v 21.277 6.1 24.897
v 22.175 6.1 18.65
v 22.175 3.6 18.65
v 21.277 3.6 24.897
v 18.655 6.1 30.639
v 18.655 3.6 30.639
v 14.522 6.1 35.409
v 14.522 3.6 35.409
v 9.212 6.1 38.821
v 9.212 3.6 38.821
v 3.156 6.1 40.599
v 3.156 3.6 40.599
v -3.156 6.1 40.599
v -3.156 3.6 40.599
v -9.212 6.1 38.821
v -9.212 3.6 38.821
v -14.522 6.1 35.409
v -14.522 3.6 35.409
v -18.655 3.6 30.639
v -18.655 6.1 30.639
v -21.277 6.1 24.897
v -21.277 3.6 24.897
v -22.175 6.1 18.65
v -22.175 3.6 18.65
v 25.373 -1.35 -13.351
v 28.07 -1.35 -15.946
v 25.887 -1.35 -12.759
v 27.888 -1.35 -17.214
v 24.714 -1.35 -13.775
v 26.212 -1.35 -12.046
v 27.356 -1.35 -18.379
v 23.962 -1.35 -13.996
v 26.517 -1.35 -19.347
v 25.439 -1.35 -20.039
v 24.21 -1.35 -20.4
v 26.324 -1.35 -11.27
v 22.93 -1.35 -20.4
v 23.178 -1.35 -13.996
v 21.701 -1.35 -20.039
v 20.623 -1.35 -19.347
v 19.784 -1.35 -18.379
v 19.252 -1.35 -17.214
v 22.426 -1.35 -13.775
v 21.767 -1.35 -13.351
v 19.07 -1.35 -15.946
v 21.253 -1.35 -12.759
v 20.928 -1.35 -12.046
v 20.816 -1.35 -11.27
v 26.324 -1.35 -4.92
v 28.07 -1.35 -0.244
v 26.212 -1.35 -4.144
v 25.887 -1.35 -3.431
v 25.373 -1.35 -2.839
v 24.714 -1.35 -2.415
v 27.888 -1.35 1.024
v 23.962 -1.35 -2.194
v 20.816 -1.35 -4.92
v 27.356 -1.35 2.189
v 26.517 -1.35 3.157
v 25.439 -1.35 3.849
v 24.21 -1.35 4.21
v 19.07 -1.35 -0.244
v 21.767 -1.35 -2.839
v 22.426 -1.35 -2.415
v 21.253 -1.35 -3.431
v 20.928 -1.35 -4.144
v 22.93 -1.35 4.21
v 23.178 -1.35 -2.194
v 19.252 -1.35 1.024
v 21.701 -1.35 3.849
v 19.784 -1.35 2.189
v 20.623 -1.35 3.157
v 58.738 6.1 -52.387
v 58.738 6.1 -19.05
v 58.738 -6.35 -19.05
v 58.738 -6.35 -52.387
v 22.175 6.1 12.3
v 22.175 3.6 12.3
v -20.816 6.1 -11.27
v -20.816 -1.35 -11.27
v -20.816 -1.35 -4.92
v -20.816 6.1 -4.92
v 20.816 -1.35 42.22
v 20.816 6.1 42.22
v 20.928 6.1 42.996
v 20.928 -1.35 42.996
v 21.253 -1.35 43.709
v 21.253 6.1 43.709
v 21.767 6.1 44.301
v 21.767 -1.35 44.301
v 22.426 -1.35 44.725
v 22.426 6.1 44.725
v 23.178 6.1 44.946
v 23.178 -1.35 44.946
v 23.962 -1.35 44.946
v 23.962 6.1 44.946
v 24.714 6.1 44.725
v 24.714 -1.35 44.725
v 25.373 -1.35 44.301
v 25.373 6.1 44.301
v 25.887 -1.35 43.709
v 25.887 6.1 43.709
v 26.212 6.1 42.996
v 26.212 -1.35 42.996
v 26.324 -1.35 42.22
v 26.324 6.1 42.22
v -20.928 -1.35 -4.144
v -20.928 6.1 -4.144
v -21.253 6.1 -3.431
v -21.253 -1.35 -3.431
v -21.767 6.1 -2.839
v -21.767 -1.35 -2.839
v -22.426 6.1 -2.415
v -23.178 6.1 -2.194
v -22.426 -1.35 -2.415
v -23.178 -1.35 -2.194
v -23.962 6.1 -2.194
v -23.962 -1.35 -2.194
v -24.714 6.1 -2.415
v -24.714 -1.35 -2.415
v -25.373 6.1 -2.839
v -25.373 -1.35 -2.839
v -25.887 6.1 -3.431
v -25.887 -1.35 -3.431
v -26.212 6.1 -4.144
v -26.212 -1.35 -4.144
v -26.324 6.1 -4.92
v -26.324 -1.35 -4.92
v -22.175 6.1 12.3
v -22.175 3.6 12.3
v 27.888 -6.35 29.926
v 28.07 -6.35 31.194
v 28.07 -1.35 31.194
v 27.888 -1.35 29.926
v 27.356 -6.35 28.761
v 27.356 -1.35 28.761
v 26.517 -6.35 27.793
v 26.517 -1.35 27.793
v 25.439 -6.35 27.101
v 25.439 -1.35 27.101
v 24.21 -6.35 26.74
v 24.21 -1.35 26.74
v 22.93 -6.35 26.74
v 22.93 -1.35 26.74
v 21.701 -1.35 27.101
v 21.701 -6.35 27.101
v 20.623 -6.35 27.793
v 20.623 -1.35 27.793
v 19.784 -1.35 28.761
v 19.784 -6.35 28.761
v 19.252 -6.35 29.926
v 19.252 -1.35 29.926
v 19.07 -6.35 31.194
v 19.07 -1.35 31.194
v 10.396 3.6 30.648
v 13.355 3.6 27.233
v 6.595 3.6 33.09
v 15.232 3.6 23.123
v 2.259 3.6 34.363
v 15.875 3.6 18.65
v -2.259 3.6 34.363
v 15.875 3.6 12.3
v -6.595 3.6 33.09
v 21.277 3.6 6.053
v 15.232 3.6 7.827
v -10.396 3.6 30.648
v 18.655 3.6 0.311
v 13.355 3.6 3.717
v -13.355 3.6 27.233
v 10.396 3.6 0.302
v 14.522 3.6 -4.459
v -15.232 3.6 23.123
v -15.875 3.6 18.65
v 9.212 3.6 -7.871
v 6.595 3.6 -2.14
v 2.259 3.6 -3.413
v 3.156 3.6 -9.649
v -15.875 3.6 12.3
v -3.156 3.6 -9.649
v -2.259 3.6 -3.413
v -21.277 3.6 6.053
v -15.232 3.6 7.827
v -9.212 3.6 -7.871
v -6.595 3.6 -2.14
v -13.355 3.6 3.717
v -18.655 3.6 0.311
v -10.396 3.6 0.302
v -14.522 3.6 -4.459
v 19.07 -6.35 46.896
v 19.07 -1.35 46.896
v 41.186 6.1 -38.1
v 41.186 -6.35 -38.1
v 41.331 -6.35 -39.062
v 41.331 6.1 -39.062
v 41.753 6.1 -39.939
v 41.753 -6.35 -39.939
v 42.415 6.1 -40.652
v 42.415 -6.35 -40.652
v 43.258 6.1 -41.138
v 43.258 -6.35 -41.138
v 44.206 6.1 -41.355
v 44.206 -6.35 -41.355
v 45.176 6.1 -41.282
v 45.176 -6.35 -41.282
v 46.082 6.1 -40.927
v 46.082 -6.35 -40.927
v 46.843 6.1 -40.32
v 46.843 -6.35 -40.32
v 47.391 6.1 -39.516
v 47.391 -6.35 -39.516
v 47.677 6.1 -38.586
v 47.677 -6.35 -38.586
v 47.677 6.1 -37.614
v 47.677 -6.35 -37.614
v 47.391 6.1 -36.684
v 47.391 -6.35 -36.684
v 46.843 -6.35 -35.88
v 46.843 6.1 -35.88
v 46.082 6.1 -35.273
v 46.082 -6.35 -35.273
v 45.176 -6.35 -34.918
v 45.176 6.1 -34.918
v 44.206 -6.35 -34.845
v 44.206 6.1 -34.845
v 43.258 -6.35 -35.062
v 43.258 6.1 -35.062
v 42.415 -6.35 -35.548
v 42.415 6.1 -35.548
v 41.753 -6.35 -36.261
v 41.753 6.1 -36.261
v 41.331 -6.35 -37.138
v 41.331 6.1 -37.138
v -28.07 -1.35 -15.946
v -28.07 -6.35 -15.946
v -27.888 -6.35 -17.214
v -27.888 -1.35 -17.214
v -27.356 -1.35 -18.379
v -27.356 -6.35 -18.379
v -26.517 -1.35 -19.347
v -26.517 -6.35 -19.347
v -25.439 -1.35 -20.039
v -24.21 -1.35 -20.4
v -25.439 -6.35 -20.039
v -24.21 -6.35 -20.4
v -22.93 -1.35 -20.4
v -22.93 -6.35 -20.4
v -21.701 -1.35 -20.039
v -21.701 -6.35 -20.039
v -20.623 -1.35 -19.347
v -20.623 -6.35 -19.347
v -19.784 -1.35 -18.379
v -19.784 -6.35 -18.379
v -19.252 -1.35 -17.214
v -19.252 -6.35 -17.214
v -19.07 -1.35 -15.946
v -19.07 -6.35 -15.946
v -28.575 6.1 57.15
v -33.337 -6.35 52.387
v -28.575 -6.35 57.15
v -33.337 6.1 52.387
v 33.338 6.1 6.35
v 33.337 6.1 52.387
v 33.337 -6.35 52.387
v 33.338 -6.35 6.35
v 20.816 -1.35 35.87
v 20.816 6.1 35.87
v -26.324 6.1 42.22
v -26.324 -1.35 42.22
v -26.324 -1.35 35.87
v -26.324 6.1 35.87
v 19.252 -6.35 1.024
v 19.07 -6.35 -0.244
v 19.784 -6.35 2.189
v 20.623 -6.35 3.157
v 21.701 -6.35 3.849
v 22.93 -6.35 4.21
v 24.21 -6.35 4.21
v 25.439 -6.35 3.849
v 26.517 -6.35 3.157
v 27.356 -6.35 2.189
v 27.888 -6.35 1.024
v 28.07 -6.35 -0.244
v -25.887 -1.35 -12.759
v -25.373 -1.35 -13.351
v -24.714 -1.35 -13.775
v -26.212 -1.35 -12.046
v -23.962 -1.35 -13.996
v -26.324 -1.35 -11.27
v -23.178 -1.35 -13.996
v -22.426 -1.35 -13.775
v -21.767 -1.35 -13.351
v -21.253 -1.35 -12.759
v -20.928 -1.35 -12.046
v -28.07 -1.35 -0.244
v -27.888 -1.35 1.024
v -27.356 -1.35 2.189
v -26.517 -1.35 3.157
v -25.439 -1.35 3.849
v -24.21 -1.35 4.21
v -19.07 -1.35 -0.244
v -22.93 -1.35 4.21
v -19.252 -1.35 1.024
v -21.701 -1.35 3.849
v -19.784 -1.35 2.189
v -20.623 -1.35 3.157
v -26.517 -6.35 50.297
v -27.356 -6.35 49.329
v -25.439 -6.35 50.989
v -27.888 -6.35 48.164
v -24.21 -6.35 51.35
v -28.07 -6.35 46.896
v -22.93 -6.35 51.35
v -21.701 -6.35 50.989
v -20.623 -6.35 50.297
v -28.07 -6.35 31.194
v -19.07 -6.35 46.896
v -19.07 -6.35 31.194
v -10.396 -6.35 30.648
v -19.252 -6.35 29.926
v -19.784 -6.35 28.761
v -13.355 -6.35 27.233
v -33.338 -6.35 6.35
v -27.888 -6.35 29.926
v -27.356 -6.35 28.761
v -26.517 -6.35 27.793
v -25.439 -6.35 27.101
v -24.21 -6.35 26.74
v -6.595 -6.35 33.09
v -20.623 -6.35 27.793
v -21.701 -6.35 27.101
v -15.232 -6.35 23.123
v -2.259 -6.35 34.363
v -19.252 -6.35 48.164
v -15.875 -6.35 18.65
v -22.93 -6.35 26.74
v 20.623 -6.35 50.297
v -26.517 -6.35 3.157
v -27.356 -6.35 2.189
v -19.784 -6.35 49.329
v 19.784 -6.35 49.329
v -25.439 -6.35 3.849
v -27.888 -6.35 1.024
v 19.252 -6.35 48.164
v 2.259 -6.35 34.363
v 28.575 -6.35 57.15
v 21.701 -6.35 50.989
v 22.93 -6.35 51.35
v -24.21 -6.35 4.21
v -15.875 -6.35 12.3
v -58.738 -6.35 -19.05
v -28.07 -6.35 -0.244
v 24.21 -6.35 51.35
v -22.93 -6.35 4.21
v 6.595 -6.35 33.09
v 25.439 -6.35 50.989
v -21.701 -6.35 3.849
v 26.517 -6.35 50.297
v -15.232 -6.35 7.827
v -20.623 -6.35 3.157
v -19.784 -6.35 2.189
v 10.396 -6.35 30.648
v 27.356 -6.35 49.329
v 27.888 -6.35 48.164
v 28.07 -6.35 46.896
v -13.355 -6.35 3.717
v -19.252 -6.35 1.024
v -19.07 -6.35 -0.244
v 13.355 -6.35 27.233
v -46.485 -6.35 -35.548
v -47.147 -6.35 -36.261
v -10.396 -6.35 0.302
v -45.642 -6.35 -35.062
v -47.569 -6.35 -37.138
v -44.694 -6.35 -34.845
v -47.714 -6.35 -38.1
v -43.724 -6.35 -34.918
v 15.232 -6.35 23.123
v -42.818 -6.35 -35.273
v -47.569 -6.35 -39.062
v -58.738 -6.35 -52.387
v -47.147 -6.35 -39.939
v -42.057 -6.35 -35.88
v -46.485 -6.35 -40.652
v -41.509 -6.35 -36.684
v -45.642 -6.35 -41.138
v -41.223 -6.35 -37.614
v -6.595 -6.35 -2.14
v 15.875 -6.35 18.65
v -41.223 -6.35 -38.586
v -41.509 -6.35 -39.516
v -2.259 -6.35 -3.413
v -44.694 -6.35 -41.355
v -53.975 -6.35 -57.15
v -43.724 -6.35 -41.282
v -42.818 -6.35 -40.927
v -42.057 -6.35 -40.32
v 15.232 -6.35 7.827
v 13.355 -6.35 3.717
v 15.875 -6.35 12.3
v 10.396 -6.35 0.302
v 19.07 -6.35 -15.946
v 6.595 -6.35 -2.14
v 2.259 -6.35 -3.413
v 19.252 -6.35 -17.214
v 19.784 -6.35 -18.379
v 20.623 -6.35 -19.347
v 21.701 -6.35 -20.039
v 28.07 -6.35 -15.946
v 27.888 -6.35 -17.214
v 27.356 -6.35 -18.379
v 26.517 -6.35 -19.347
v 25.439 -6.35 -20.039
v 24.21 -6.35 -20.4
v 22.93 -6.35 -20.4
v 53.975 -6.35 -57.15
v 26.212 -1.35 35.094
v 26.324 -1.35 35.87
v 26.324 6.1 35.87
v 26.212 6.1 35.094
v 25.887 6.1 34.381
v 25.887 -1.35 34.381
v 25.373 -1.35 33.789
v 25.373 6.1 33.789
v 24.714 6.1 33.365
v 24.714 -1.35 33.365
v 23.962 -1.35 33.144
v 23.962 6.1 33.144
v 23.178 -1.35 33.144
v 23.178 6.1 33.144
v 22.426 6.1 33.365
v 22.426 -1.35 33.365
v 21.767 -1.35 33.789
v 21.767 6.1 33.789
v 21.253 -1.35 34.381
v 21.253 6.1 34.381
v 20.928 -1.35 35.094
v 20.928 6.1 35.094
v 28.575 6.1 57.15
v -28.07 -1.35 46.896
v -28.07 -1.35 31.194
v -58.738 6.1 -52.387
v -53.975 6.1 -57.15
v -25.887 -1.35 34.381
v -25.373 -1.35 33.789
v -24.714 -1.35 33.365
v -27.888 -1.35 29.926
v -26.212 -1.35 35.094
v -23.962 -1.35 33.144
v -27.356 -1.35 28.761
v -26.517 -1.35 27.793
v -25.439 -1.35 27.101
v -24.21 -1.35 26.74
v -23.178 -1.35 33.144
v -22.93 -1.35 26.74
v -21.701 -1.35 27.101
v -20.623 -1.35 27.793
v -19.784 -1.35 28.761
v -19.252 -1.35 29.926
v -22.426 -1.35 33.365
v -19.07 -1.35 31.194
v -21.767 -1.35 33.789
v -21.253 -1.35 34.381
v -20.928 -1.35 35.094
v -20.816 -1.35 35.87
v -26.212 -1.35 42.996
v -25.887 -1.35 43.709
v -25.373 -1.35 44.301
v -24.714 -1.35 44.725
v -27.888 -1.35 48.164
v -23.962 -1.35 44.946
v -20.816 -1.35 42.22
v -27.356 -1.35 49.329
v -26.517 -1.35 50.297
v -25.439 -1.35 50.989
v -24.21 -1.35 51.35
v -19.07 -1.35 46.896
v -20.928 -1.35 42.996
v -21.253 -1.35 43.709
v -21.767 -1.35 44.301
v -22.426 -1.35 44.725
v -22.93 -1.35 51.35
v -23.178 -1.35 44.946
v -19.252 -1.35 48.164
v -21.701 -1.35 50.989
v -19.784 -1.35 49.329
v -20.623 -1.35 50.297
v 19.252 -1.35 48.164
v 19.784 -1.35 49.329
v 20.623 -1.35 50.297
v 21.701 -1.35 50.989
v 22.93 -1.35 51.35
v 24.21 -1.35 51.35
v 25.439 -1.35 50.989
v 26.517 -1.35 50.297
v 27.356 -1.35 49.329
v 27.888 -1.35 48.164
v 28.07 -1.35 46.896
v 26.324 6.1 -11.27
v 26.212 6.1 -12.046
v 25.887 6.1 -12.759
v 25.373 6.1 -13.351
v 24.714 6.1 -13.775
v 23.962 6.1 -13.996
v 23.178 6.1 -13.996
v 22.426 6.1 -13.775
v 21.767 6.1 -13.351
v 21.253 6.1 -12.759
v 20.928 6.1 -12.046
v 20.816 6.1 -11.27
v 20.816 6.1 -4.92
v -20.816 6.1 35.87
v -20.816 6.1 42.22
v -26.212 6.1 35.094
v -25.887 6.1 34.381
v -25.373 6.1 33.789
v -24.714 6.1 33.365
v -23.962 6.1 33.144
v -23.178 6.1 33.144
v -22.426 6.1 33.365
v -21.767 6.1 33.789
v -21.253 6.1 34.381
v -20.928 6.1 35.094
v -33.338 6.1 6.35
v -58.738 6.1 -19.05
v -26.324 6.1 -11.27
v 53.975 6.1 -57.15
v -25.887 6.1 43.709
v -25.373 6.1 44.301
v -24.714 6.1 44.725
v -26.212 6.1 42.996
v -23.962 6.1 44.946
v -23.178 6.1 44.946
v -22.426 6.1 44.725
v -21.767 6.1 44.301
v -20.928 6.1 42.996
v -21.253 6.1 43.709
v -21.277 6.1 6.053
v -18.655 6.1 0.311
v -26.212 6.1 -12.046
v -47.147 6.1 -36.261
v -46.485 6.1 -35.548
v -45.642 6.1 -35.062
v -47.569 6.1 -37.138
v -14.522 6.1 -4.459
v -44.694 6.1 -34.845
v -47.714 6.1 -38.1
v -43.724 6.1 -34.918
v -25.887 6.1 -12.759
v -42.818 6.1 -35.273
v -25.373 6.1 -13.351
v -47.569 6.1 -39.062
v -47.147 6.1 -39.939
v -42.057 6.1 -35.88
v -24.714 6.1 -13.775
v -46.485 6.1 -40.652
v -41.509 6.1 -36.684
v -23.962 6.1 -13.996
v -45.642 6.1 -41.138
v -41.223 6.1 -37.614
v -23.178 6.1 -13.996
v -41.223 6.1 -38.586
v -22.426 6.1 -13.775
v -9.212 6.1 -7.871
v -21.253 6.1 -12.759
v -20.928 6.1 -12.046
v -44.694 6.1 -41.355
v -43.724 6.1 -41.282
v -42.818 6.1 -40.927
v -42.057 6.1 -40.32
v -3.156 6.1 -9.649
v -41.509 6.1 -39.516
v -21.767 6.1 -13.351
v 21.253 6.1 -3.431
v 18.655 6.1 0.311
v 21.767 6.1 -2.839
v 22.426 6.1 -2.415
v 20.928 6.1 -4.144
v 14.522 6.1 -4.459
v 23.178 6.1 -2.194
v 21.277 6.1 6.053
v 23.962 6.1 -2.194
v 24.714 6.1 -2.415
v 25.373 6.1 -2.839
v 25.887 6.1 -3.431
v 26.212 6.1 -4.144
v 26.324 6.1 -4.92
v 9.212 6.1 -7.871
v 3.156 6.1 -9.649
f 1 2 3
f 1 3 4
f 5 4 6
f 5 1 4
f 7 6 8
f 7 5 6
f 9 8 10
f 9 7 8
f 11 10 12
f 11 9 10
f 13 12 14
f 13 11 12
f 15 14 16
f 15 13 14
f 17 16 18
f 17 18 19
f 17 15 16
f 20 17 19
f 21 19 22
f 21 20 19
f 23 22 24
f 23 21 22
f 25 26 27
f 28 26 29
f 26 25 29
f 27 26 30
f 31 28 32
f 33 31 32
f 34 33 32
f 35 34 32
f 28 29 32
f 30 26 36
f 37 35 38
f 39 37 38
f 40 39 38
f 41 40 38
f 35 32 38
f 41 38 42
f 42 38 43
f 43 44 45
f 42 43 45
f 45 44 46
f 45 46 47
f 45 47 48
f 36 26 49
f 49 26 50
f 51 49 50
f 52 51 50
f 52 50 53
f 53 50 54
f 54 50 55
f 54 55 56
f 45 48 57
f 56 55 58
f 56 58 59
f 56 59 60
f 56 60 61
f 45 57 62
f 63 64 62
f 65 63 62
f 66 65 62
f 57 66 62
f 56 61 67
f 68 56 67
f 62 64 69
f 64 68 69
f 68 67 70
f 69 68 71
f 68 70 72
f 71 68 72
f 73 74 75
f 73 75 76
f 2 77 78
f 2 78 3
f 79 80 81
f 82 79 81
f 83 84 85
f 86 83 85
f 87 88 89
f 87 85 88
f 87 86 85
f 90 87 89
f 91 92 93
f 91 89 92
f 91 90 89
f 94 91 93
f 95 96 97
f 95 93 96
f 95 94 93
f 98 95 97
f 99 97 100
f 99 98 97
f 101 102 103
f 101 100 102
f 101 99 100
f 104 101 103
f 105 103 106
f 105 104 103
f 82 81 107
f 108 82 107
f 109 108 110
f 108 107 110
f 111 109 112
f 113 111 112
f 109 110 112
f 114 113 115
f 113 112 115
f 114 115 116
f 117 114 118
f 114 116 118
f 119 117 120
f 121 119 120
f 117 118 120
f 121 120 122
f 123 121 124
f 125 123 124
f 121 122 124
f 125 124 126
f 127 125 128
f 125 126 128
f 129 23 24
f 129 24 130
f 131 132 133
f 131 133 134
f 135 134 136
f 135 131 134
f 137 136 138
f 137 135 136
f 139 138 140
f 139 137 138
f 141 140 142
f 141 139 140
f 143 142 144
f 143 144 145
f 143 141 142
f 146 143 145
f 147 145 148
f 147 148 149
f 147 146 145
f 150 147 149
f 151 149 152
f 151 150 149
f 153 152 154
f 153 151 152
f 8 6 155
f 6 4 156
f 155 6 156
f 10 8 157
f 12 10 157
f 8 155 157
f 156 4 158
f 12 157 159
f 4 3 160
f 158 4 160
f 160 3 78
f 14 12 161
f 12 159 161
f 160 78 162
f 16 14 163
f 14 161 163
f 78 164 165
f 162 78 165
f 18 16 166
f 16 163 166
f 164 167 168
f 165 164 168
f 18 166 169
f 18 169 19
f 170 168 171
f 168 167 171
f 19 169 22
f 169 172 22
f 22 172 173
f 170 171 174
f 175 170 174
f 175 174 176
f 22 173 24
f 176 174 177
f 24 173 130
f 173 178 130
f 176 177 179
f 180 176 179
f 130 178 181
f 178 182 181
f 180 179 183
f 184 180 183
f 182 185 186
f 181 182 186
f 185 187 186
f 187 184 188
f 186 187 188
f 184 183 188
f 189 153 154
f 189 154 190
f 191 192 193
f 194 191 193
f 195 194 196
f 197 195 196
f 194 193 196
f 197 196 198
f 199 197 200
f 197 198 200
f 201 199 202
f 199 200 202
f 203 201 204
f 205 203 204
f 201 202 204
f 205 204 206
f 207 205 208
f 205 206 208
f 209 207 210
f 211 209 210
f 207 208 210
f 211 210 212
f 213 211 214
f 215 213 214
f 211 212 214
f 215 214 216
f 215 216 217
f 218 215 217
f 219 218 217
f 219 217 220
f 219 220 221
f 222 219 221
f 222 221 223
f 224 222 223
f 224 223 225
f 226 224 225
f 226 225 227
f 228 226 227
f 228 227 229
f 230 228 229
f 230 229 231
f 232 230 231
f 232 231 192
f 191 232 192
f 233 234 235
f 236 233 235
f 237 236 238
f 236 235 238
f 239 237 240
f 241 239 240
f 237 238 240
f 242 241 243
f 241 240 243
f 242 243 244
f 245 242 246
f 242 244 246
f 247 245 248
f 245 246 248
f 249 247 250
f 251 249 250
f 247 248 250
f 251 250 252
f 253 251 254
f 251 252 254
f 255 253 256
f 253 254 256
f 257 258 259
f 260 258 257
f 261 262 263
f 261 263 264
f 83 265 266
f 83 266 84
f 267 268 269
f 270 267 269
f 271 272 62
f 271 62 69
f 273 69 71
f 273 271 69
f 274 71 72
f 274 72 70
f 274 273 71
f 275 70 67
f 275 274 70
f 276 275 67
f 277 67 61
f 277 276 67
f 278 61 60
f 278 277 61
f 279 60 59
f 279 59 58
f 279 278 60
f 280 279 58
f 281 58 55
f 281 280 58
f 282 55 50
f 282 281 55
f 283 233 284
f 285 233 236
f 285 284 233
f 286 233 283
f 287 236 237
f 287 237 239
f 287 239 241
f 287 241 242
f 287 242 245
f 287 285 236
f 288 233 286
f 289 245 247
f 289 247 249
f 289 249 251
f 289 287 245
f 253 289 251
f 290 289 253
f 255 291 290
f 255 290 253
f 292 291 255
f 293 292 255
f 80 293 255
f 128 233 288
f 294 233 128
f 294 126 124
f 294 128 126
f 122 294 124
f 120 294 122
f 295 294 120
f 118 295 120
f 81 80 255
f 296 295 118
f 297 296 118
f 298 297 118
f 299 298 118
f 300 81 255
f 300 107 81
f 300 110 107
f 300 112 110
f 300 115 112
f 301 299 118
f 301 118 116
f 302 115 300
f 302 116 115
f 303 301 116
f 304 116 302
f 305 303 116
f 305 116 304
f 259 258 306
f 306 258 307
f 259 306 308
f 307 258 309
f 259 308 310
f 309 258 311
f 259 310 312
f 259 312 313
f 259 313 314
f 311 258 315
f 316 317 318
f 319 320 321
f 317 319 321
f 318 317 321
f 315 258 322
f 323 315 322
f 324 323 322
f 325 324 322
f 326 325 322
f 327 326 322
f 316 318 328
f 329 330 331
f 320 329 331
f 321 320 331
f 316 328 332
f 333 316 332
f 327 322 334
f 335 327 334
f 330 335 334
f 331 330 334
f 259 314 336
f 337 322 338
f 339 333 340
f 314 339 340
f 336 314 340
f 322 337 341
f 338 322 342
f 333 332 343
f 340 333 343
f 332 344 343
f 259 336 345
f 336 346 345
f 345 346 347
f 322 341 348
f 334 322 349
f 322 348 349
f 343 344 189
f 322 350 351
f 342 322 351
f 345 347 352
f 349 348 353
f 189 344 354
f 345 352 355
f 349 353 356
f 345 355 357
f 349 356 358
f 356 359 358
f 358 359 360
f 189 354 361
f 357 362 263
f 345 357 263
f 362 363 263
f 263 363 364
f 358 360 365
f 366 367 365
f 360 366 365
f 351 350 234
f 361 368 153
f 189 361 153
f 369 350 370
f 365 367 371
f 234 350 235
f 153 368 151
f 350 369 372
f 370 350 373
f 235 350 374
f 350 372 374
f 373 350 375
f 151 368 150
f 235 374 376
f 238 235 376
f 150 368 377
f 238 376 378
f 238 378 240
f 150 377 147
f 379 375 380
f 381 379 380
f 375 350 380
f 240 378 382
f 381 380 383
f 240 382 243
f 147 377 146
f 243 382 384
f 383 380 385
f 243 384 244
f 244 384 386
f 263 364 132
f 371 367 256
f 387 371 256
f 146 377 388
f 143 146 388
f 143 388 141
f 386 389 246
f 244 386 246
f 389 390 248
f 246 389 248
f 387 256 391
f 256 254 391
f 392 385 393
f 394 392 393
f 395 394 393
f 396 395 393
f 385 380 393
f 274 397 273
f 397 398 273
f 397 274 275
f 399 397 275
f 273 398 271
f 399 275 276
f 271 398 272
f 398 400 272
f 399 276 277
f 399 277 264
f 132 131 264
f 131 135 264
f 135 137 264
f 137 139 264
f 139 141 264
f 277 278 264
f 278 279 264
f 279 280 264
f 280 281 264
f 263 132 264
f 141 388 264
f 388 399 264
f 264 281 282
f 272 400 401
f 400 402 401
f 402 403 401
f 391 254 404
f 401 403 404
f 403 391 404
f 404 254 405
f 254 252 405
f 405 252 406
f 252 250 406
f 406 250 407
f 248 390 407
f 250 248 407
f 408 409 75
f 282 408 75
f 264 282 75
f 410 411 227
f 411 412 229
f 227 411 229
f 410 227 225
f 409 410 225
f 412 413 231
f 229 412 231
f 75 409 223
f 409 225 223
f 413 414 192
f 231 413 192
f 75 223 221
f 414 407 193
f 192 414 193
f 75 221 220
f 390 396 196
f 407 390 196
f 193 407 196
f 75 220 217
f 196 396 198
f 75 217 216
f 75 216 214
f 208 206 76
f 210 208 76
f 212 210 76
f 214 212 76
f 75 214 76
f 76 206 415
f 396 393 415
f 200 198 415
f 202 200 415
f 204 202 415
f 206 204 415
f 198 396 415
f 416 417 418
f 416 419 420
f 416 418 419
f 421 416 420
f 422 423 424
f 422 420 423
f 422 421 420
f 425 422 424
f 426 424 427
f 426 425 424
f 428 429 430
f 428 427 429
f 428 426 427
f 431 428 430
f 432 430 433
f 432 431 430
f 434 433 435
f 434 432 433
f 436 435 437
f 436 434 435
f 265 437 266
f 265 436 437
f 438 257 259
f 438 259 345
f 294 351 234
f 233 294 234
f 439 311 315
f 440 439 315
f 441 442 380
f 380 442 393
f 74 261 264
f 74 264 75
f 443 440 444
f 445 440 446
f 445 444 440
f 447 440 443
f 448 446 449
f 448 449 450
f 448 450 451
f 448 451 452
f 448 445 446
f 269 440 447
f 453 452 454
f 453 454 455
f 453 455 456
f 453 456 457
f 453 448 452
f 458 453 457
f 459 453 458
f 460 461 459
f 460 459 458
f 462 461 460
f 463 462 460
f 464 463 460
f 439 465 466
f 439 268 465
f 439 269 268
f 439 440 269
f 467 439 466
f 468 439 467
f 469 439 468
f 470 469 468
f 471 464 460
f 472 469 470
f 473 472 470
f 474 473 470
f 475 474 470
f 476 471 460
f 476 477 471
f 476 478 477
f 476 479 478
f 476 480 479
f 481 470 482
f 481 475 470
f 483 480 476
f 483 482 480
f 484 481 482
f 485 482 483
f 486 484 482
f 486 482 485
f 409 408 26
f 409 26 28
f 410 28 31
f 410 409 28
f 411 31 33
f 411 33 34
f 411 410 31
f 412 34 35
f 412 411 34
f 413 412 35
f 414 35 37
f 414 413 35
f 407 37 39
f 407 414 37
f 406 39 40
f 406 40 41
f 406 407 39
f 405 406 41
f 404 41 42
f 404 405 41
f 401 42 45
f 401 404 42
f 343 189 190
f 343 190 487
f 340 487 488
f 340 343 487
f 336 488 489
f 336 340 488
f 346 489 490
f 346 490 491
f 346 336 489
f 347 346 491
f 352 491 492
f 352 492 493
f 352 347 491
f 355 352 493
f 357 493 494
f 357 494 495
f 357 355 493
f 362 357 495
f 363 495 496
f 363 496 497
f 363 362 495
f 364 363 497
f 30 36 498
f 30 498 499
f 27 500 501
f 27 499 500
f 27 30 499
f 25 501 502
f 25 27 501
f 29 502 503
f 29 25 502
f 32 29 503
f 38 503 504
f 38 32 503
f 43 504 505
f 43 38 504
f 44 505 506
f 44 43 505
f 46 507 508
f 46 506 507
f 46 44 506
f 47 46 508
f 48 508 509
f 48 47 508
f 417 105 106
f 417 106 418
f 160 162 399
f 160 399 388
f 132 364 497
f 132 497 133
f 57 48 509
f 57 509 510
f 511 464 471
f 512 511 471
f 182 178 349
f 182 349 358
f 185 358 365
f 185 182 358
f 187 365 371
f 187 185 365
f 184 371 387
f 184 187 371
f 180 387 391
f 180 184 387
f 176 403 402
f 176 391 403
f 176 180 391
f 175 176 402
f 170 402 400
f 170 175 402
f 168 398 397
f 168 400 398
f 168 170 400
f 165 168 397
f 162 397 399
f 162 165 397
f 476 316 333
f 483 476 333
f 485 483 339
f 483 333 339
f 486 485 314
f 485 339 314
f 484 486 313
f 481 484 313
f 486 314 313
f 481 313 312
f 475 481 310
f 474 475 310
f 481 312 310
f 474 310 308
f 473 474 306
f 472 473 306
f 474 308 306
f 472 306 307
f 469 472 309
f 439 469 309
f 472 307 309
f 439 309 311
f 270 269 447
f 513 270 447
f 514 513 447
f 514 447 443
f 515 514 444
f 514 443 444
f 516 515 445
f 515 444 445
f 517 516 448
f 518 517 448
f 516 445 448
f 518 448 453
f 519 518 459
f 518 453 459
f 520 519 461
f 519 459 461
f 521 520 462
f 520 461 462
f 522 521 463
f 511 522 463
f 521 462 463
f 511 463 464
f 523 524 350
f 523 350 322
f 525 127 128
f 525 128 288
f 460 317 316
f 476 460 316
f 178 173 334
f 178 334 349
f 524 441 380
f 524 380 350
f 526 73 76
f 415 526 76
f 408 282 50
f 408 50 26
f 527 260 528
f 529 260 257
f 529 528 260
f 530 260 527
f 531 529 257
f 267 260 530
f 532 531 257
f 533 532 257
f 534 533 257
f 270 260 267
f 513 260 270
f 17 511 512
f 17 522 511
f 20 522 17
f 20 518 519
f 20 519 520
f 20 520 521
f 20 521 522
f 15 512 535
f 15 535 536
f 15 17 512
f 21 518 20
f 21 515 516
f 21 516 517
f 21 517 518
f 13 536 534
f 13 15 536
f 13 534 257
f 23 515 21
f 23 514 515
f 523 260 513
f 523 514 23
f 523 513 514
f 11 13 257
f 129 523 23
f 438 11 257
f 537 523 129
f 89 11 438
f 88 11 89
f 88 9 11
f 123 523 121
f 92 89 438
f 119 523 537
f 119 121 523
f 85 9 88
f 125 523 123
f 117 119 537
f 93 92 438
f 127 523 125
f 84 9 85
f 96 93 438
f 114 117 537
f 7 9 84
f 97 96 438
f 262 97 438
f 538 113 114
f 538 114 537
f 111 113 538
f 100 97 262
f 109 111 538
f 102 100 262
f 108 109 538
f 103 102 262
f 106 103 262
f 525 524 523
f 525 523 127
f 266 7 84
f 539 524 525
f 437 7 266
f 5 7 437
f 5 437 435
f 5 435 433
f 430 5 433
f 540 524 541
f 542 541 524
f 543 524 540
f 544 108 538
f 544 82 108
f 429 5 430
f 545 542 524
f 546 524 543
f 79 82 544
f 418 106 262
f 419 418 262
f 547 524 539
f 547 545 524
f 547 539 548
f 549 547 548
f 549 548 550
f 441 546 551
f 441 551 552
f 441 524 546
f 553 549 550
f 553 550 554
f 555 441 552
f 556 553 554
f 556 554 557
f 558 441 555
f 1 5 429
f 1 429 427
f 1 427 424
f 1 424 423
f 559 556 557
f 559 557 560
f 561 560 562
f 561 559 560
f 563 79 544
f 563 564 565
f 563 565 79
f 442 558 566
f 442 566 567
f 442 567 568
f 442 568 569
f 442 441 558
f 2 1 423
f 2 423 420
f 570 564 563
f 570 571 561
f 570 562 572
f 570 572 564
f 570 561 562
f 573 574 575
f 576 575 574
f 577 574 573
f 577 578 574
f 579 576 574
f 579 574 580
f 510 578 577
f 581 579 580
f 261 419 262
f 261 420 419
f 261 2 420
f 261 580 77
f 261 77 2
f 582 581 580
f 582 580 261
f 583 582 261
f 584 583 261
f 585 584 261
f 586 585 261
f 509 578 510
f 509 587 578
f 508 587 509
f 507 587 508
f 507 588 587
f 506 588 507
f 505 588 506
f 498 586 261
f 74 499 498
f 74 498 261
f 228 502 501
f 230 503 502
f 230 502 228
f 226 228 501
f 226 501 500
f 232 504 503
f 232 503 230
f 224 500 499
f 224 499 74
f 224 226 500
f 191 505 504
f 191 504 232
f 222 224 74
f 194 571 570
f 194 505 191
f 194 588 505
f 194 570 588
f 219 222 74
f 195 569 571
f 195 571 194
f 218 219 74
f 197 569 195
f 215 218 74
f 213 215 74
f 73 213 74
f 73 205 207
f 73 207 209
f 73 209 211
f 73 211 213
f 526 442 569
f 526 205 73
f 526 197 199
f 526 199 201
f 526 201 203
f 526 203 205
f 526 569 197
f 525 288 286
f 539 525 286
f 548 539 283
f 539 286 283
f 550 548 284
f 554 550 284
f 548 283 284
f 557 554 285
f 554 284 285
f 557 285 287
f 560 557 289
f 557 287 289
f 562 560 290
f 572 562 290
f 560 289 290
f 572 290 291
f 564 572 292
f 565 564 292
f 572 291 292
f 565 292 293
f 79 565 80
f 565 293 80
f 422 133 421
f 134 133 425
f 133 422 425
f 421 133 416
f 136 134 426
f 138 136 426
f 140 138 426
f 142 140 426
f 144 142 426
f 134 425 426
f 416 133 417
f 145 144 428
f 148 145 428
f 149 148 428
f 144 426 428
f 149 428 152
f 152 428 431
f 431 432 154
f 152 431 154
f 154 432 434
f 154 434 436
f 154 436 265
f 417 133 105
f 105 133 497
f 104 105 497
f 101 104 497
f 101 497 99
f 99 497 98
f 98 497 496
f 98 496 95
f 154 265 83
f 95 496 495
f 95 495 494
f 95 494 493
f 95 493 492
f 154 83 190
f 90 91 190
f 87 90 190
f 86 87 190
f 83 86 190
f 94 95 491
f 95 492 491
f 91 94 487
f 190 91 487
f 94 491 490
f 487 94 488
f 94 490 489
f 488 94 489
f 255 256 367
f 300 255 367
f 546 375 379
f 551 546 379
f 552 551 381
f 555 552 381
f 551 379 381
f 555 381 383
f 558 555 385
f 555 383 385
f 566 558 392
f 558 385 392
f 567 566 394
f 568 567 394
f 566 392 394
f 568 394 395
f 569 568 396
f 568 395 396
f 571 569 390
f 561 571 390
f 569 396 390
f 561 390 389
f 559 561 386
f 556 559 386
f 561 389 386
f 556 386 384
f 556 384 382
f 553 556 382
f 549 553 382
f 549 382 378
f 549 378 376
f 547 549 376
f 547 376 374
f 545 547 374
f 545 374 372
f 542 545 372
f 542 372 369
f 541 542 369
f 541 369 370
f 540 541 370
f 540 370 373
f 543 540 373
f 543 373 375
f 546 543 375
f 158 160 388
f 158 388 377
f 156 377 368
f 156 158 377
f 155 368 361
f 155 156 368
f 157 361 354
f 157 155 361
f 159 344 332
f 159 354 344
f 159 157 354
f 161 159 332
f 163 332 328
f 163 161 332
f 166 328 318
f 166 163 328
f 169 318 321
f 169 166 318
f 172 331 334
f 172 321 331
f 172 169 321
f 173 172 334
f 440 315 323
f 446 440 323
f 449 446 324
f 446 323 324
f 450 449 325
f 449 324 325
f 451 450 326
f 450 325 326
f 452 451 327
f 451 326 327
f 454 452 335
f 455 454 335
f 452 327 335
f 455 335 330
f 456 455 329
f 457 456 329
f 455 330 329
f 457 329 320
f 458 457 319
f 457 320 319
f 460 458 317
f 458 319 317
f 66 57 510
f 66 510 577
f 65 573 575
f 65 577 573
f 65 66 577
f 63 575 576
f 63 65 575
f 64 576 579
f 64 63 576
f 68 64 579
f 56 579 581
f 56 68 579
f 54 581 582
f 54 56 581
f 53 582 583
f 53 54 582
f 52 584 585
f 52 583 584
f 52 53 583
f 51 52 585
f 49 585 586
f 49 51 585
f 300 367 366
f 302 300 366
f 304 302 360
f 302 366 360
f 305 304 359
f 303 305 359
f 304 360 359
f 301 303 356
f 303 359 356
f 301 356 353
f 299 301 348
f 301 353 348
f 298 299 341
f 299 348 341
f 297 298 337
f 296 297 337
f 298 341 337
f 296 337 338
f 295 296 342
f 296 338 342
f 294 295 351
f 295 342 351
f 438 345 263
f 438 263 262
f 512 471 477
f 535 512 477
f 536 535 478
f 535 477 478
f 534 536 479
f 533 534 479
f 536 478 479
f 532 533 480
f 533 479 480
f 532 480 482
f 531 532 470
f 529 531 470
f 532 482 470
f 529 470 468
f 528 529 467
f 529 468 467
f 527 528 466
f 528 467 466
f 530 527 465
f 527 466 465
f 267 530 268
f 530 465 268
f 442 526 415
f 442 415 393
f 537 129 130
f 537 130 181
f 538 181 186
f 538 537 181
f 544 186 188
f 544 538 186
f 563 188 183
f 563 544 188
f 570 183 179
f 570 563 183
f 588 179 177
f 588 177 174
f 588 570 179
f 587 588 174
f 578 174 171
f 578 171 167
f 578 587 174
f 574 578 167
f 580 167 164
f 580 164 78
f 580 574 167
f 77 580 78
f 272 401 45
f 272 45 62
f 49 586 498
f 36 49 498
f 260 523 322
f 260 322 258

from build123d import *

# Parameters (mm, degrees)
BOSS_EXTRUDE1_DEPTH      = 6.35
F_5_16_18_TAPPED_HOLE1_D = 6.5278
CUT_EXTRUDE1_START       = -0.25
CUT_EXTRUDE1_DEPTH       = 0.25
CUT_EXTRUDE5_DEPTH       = 13.45
CUT_EXTRUDE6_DEPTH       = 5.00000016
CUT_EXTRUDE3_DEPTH       = 2.5
CUT_EXTRUDE4_DEPTH       = 10.95
CHAMFER1_SIZE            = 4.7625


with BuildPart() as part:
    # Sketch1 → Boss-Extrude1 (new body, symmetric)
    with BuildSketch(Plane(origin=(0, 0, 0), x_dir=(1, 0, 0), z_dir=(0, 1, 0))):
        Polygon((-33.3375, 57.15), (-58.7375, 57.15), (-58.7375, 19.05), (-33.3375, -6.35), (-33.3375, -57.15), (33.3375, -57.15), (33.3375, -6.35), (58.7375, 19.05), (58.7375, 57.15), (33.3375, 57.15), align=None)
    extrude(amount=BOSS_EXTRUDE1_DEPTH, both=True)

    # 5/16-18 Tapped Hole1 (through all)
    with Locations(Plane(origin=(0, 6.35, 0), x_dir=(1, 0, 0), z_dir=(0, 1, 0))):
        with Locations((-44.45, 38.1), (44.45, 38.1)):
            Hole(F_5_16_18_TAPPED_HOLE1_D / 2)

    # Sketch4 → Cut-Extrude1 (cut)
    with BuildSketch(Plane(origin=(0, 6.35, 0), x_dir=(1, 0, 0), z_dir=(0, 1, 0)).offset(CUT_EXTRUDE1_START)):
        Polygon((33.3375, -57.15), (33.3375, -6.35), (58.7375, 19.05), (58.7375, 57.15), (-58.7375, 57.15), (-58.7375, 19.05), (-33.3375, -6.35), (-33.3375, -57.15), align=None)
    extrude(amount=CUT_EXTRUDE1_DEPTH, mode=Mode.SUBTRACT)

    # Sketch12 → Cut-Extrude5 (cut, through all)
    with BuildSketch(Plane.XZ.offset(6.35)):
        with BuildLine():
            Line((26.324, -4.92), (26.324, -11.27))
            ThreePointArc((26.324, -11.27), (23.57, -14.024), (20.816, -11.27))
            Line((20.816, -11.27), (20.816, -4.92))
            ThreePointArc((20.816, -4.92), (23.57, -2.166), (26.324, -4.92))
        make_face()
        with BuildLine():
            Line((20.816, 35.87), (20.816, 42.22))
            ThreePointArc((20.816, 42.22), (23.57, 44.974), (26.324, 42.22))
            Line((26.324, 42.22), (26.324, 35.87))
            ThreePointArc((26.324, 35.87), (23.57, 33.116), (20.816, 35.87))
        make_face()
    cut_extrude5 = extrude(amount=-CUT_EXTRUDE5_DEPTH, mode=Mode.SUBTRACT)

    # Sketch13 → Cut-Extrude6 (cut)
    with BuildSketch(Plane.XZ.offset(6.35)):
        with BuildLine():
            Line((19.069999983, -15.945999919), (19.069999983, -0.244000081))
            ThreePointArc((19.069999983, -0.244000081), (23.57, 4.255999936), (28.070000017, -0.244000081))
            Line((28.070000017, -0.244000081), (28.070000017, -15.945999919))
            ThreePointArc((28.070000017, -15.945999919), (23.57, -20.445999936), (19.069999983, -15.945999919))
        make_face()
        with BuildLine():
            Line((19.069999983, 31.194000081), (19.069999983, 46.895999919))
            ThreePointArc((19.069999983, 46.895999919), (23.57, 51.395999936), (28.070000017, 46.895999919))
            Line((28.070000017, 46.895999919), (28.070000017, 31.194000081))
            ThreePointArc((28.070000017, 31.194000081), (23.57, 26.694000064), (19.069999983, 31.194000081))
        make_face()
    cut_extrude6 = extrude(amount=-CUT_EXTRUDE6_DEPTH, mode=Mode.SUBTRACT)

    # Mirror1: Cut-Extrude5, Cut-Extrude6 across plane
    add(cut_extrude5.mirror(Plane(origin=(0, 0, 0), x_dir=(0, 0, 1), z_dir=(1, 0, 0))), mode=Mode.SUBTRACT)
    add(cut_extrude6.mirror(Plane(origin=(0, 0, 0), x_dir=(0, 0, 1), z_dir=(1, 0, 0))), mode=Mode.SUBTRACT)

    # Sketch8 → Cut-Extrude3 (cut)
    with BuildSketch(Plane(origin=(0, 6.1, 0), x_dir=(1, 0, 0), z_dir=(0, 1, 0))):
        with BuildLine():
            Line((-22.175, -18.65), (-22.175, -12.3))
            ThreePointArc((-22.175, -12.3), (0, 9.875), (22.175, -12.3))
            Line((22.175, -12.3), (22.175, -18.65))
            ThreePointArc((22.175, -18.65), (0, -40.825), (-22.175, -18.65))
        make_face()
    extrude(amount=-CUT_EXTRUDE3_DEPTH, mode=Mode.SUBTRACT)

    # Sketch9 → Cut-Extrude4 (cut, through all)
    with BuildSketch(Plane(origin=(0, 3.6, 0), x_dir=(1, 0, 0), z_dir=(0, 1, 0))):
        with BuildLine():
            Line((-15.875, -18.65), (-15.875, -12.3))
            ThreePointArc((-15.875, -12.3), (0, 3.575), (15.875, -12.3))
            Line((15.875, -12.3), (15.875, -18.65))
            ThreePointArc((15.875, -18.65), (0, -34.525), (-15.875, -18.65))
        make_face()
    extrude(amount=-CUT_EXTRUDE4_DEPTH, mode=Mode.SUBTRACT)

    # Chamfer1
    chamfer1_edges = [part.edges().sort_by_distance(p)[0] for p in [
        (33.3375, -0.125, 57.15),
        (-33.3375, -0.125, 57.15),
        (-58.7375, -0.125, -57.15),
        (58.7375, -0.125, -57.15),
    ]]
    chamfer(chamfer1_edges, length=CHAMFER1_SIZE)


solid = part.part
